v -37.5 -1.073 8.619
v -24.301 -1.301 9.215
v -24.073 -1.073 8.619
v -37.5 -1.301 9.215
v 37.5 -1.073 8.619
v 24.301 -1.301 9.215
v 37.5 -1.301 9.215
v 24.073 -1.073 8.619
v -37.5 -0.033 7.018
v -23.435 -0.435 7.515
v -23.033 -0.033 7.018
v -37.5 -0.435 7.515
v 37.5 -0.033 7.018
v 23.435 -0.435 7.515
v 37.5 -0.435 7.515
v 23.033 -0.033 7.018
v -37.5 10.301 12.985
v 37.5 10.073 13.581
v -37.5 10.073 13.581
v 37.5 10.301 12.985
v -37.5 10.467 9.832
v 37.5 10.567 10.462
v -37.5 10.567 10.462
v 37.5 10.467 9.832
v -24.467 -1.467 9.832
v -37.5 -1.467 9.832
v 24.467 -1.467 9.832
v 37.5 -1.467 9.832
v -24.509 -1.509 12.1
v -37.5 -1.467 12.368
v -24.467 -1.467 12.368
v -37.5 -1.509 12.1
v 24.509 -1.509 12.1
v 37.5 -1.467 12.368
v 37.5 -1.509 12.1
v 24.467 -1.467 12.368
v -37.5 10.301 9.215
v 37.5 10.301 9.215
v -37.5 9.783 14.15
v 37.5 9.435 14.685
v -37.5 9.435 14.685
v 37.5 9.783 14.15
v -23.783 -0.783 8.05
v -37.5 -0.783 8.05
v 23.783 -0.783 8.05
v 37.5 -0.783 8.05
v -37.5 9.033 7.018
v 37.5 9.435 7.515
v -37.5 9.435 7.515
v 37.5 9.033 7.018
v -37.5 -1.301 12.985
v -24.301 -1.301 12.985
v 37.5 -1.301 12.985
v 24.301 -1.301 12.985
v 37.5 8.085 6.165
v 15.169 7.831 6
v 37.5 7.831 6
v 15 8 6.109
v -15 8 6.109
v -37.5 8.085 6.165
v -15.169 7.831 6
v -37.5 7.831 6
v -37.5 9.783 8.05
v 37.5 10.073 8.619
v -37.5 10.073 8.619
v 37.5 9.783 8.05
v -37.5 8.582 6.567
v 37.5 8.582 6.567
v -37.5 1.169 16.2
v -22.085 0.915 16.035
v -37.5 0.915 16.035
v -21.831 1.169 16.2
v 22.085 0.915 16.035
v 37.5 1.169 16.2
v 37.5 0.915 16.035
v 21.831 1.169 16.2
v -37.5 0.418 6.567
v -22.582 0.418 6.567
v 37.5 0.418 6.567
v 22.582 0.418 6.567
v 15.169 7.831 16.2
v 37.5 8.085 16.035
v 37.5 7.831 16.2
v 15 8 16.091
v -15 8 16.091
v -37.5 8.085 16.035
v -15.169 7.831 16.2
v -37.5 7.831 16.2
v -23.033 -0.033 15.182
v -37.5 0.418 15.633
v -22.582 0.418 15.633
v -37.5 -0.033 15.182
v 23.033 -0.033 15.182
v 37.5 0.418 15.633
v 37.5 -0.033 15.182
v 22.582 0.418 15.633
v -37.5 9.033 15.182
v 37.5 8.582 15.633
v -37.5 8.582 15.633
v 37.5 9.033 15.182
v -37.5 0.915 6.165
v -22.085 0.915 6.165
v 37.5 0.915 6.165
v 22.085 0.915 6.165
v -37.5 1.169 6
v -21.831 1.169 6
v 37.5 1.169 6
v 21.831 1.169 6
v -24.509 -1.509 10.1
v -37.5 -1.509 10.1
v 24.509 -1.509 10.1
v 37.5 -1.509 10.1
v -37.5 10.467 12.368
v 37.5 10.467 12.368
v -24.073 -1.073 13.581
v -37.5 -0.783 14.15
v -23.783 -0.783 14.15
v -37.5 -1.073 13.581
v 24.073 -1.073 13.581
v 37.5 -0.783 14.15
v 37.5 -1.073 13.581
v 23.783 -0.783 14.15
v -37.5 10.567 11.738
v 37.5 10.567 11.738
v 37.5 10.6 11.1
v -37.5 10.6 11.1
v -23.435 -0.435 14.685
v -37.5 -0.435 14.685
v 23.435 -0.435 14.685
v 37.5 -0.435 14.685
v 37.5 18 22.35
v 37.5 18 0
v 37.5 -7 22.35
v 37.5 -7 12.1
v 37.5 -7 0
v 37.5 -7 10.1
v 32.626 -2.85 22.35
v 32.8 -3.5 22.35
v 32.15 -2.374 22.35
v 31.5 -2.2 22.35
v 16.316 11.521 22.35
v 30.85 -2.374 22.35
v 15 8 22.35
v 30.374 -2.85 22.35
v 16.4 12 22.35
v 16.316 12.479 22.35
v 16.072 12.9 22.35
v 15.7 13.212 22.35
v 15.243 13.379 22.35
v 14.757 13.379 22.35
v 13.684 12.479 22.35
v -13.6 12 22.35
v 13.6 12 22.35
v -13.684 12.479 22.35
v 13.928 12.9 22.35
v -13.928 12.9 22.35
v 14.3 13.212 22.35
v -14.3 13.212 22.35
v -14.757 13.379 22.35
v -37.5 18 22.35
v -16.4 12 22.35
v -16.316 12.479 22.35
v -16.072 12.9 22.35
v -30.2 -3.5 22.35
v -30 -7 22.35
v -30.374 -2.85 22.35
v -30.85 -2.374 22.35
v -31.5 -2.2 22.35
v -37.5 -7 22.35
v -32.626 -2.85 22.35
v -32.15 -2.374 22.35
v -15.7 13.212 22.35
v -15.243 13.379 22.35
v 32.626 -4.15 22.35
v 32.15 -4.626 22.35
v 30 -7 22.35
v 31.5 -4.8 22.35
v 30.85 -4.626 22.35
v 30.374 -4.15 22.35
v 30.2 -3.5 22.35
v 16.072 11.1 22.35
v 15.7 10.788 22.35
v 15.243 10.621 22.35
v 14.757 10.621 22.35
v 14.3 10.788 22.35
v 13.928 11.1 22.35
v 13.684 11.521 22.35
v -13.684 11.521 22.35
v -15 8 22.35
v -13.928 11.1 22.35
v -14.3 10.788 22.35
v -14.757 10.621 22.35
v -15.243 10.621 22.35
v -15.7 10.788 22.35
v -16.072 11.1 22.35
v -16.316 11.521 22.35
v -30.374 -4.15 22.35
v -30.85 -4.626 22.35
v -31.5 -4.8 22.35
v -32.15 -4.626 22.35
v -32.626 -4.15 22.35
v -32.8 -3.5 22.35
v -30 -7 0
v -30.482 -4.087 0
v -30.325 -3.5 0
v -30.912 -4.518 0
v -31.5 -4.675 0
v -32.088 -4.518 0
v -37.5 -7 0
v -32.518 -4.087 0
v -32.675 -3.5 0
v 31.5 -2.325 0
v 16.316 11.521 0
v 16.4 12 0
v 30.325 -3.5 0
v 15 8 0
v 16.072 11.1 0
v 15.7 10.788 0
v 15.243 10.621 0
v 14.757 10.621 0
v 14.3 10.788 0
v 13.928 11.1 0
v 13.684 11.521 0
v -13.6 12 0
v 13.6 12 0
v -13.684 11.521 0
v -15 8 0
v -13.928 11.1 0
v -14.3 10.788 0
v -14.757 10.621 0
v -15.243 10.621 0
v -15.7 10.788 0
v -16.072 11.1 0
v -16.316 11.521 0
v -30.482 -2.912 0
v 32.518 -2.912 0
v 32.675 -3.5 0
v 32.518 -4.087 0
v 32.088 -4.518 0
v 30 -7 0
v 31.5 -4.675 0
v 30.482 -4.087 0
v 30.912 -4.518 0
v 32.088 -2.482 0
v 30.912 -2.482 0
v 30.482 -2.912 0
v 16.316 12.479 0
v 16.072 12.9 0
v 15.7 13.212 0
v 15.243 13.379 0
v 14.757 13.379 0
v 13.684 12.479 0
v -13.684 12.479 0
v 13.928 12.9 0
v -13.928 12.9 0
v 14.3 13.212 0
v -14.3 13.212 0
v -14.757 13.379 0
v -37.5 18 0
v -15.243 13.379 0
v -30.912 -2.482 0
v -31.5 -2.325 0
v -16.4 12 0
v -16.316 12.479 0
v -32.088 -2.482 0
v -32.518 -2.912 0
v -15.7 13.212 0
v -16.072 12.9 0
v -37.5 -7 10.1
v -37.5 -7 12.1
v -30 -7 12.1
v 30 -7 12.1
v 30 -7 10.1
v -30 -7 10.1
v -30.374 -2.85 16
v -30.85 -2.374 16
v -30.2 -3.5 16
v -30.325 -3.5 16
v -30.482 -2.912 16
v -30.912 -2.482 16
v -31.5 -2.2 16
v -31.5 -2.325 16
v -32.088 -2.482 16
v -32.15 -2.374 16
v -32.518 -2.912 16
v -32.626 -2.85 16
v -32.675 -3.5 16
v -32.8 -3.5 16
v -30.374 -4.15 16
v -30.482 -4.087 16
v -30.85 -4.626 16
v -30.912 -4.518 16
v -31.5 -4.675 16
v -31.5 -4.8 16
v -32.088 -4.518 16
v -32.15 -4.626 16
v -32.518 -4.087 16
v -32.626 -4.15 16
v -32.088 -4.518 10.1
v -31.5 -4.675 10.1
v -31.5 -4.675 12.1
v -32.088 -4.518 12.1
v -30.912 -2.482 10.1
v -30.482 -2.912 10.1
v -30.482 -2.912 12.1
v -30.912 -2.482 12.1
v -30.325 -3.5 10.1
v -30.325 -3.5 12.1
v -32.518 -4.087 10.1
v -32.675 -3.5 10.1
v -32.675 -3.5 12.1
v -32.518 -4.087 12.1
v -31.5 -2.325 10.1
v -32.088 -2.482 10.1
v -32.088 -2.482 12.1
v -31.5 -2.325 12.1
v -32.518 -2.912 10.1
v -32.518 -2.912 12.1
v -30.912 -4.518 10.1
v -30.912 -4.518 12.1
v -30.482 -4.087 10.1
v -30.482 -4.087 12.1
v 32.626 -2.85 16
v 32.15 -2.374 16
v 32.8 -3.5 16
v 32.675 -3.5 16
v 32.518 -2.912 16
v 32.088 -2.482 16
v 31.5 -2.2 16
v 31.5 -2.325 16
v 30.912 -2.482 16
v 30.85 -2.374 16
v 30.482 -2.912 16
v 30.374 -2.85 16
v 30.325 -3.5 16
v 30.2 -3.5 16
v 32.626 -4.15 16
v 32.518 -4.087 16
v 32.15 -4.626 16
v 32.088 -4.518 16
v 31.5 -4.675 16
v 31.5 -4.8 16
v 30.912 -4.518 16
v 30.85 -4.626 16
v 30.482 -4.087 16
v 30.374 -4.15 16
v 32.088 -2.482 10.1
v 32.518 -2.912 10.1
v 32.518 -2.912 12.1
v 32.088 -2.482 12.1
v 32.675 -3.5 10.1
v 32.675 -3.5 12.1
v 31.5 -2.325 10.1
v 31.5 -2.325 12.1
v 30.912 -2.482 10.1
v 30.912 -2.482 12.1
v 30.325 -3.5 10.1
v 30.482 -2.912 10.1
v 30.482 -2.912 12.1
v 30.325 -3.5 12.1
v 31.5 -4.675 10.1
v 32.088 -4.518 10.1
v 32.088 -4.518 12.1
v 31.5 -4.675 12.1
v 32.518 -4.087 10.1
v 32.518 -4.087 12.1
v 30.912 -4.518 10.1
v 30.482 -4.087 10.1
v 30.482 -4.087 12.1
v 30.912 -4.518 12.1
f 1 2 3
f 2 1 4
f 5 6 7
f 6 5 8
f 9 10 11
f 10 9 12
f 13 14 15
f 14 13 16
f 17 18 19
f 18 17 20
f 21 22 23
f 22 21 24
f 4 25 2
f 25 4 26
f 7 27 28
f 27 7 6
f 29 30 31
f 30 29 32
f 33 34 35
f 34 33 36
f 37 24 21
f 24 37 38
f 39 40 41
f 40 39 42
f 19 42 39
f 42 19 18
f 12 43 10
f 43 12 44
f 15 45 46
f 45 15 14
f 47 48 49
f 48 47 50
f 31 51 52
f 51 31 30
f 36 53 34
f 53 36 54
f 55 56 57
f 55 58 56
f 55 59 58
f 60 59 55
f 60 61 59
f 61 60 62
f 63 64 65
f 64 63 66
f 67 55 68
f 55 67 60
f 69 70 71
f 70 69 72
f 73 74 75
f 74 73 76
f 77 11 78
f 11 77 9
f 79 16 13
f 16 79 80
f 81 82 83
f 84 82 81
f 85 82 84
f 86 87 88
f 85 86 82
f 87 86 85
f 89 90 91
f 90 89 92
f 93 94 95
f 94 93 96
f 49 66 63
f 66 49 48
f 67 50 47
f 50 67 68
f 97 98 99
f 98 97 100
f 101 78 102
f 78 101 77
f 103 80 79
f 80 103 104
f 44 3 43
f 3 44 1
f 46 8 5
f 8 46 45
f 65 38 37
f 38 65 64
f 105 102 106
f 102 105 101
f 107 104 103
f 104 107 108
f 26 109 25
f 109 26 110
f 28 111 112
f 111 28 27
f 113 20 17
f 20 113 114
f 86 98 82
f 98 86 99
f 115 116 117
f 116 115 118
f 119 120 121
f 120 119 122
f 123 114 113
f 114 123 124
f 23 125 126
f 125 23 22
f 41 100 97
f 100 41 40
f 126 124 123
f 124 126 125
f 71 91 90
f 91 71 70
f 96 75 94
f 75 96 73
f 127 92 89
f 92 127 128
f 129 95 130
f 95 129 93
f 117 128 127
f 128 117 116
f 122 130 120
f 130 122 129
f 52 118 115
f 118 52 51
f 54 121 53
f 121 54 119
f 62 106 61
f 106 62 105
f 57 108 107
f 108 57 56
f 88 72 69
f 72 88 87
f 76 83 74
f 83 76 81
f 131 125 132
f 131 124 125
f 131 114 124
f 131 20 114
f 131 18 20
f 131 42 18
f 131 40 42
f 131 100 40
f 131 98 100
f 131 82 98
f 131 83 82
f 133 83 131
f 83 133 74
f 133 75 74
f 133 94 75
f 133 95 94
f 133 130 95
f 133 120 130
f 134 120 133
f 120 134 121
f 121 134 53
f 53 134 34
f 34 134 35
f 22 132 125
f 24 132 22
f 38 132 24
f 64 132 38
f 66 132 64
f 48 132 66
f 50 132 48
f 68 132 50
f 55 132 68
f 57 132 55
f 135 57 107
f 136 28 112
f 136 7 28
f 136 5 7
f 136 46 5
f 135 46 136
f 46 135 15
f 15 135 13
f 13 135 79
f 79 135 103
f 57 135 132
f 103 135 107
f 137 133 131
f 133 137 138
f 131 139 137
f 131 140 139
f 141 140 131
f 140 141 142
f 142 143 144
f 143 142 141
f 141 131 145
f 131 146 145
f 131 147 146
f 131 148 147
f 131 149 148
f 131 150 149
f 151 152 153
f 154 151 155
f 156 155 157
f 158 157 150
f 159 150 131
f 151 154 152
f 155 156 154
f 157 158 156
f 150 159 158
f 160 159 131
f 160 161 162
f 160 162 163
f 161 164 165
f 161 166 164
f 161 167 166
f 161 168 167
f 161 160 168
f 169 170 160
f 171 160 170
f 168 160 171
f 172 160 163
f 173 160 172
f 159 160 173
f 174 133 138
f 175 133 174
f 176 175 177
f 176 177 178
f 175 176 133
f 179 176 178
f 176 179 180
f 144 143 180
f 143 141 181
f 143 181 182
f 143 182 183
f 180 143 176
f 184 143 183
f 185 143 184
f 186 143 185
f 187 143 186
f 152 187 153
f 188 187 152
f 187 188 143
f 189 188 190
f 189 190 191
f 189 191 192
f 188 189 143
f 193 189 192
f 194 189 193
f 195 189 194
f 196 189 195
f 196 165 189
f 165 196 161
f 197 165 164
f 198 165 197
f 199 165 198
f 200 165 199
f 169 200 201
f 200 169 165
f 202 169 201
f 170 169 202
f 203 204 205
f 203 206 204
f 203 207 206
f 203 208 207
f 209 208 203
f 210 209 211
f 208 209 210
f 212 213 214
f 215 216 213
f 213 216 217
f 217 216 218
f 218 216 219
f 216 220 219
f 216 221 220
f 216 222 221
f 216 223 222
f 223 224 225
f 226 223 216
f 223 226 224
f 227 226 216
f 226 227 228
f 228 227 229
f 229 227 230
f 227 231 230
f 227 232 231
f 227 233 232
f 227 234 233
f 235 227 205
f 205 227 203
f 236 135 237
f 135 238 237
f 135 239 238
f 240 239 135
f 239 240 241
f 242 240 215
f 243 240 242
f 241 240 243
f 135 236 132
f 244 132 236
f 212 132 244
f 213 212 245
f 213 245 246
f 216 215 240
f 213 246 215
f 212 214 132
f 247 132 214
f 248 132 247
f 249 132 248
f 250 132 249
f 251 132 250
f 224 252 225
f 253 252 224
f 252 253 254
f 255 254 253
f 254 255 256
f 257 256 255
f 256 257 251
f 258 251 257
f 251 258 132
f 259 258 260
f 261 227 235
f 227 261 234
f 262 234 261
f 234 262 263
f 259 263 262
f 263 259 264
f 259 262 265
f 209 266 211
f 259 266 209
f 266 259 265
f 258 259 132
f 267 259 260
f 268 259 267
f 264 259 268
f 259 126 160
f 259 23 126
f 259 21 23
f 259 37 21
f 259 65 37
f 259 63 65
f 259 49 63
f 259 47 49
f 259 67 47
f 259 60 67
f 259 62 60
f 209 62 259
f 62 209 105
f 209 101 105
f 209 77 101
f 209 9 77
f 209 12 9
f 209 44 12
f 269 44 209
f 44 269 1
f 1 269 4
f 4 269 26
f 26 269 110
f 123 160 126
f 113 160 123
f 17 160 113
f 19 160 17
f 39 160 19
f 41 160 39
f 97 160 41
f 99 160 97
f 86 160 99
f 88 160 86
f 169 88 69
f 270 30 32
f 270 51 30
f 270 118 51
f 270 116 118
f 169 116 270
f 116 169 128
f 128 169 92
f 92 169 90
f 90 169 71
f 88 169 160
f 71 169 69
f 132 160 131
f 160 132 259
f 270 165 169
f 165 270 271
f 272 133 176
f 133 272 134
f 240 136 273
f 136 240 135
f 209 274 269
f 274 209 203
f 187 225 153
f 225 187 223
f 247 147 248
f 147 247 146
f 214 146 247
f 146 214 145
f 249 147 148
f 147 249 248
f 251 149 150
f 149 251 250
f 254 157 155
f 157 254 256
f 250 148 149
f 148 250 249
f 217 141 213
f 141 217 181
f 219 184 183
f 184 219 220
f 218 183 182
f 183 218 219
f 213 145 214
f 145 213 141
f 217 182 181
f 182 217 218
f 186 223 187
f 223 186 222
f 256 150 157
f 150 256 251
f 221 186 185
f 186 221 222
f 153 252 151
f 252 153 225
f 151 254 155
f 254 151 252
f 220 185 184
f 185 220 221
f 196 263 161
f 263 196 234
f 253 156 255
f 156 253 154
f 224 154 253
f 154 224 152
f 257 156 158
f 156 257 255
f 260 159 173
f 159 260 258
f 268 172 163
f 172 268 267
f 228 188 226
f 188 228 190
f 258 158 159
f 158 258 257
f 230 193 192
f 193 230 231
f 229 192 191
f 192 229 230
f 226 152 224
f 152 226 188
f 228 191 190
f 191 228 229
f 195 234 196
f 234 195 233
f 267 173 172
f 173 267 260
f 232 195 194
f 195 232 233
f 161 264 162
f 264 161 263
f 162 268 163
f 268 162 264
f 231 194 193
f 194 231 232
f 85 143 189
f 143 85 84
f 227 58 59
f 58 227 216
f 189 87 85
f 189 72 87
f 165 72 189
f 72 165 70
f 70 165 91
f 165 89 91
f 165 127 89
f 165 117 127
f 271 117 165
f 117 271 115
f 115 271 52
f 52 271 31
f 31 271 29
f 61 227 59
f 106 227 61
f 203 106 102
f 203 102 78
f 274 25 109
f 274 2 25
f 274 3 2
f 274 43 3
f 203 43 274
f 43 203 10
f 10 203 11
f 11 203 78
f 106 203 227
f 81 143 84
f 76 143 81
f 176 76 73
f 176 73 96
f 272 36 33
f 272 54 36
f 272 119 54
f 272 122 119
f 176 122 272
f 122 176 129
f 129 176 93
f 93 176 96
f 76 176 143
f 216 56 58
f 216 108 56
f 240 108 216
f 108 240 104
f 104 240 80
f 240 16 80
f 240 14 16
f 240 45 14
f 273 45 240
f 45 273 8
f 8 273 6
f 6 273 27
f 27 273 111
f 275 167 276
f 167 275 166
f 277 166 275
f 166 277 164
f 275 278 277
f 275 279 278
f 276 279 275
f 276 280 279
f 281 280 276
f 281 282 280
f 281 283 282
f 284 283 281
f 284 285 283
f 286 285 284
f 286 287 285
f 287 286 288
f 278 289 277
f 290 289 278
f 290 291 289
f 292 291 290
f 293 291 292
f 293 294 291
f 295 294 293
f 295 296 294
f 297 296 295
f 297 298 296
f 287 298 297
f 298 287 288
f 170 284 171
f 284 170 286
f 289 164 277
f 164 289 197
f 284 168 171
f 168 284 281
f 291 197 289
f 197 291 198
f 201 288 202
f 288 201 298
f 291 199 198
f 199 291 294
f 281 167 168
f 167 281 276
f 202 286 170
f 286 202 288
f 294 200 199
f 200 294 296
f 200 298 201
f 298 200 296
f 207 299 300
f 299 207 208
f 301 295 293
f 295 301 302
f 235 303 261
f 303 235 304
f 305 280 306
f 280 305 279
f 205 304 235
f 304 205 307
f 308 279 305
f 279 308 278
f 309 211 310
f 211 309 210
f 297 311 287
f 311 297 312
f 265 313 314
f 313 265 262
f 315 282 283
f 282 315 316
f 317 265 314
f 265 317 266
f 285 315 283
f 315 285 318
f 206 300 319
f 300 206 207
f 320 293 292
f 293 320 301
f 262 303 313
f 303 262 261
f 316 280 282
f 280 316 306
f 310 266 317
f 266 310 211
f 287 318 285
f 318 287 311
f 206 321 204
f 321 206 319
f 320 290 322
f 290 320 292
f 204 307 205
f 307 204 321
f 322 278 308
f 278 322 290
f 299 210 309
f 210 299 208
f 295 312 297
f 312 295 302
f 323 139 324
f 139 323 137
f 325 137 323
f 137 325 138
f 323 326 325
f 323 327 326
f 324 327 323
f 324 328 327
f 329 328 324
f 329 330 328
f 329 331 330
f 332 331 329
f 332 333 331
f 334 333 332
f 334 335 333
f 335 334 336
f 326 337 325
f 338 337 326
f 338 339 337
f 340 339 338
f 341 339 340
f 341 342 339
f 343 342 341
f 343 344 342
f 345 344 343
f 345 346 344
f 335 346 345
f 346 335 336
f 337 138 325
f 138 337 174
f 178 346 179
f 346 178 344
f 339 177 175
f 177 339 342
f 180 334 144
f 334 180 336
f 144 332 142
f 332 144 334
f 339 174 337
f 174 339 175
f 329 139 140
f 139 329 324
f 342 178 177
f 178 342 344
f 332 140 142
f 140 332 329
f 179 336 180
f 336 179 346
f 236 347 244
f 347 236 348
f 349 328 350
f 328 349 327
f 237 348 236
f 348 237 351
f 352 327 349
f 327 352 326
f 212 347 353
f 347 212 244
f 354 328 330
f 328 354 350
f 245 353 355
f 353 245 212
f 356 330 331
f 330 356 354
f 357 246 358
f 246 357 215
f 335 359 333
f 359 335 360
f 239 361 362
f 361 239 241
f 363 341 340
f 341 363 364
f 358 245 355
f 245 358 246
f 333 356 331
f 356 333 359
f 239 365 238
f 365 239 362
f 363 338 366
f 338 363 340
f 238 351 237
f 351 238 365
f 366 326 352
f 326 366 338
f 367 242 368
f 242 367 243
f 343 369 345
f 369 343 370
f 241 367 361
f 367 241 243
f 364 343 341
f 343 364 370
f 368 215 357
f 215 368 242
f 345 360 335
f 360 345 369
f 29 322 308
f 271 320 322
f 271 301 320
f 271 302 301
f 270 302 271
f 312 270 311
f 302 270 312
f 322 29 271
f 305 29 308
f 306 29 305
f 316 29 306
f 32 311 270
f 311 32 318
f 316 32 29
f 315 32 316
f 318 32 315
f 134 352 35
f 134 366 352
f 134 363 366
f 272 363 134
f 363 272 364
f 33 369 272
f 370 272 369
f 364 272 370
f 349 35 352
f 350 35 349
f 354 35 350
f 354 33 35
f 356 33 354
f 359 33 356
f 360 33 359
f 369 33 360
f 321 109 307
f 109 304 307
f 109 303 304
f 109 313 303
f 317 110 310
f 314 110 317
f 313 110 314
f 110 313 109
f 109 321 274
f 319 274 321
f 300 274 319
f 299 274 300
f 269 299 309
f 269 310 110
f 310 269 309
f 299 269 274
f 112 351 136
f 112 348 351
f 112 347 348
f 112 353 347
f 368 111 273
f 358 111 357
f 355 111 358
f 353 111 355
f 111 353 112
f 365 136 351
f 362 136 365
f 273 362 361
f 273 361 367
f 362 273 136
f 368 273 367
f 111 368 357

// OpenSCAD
$fn=18;

difference(){
translate([-37.5,-7,0])cube([75,25,22.35]);
//translate([-25.5,-17,-1])cube([51,25,24]);
translate([15,12,-1])cylinder(d=2.8,h=32);    
translate([-15,12,-1])cylinder(d=2.8,h=32); 
hull(){
translate([-15,-8,-1])cylinder(d=32,h=30,$fn=4);
translate([15,-8,-1])cylinder(d=32,h=30,$fn=4);
}
translate([0,4.5,11.1])rotate([0,90,0])
difference(){
    translate([0,0,-40])cylinder(d=12.2,h=80,$fn=60);
    translate([6.1,0,0])cube([2,16,80],center=true);
    translate([-6.1,0,0])cube([2,16,80],center=true);
}
translate([-31.5,-3.5,16])cylinder(d=2.6,h=11,$fn=12);
translate([-31.5,-3.5,-1])cylinder(d=2.35,h=24,$fn=12);
translate([31.5,-3.5,16])cylinder(d=2.6,h=11,$fn=12);
translate([31.5,-3.5,-1])cylinder(d=2.35,h=24,$fn=12);

translate([-40,-20,10.1])cube([80,20,2]);
}
